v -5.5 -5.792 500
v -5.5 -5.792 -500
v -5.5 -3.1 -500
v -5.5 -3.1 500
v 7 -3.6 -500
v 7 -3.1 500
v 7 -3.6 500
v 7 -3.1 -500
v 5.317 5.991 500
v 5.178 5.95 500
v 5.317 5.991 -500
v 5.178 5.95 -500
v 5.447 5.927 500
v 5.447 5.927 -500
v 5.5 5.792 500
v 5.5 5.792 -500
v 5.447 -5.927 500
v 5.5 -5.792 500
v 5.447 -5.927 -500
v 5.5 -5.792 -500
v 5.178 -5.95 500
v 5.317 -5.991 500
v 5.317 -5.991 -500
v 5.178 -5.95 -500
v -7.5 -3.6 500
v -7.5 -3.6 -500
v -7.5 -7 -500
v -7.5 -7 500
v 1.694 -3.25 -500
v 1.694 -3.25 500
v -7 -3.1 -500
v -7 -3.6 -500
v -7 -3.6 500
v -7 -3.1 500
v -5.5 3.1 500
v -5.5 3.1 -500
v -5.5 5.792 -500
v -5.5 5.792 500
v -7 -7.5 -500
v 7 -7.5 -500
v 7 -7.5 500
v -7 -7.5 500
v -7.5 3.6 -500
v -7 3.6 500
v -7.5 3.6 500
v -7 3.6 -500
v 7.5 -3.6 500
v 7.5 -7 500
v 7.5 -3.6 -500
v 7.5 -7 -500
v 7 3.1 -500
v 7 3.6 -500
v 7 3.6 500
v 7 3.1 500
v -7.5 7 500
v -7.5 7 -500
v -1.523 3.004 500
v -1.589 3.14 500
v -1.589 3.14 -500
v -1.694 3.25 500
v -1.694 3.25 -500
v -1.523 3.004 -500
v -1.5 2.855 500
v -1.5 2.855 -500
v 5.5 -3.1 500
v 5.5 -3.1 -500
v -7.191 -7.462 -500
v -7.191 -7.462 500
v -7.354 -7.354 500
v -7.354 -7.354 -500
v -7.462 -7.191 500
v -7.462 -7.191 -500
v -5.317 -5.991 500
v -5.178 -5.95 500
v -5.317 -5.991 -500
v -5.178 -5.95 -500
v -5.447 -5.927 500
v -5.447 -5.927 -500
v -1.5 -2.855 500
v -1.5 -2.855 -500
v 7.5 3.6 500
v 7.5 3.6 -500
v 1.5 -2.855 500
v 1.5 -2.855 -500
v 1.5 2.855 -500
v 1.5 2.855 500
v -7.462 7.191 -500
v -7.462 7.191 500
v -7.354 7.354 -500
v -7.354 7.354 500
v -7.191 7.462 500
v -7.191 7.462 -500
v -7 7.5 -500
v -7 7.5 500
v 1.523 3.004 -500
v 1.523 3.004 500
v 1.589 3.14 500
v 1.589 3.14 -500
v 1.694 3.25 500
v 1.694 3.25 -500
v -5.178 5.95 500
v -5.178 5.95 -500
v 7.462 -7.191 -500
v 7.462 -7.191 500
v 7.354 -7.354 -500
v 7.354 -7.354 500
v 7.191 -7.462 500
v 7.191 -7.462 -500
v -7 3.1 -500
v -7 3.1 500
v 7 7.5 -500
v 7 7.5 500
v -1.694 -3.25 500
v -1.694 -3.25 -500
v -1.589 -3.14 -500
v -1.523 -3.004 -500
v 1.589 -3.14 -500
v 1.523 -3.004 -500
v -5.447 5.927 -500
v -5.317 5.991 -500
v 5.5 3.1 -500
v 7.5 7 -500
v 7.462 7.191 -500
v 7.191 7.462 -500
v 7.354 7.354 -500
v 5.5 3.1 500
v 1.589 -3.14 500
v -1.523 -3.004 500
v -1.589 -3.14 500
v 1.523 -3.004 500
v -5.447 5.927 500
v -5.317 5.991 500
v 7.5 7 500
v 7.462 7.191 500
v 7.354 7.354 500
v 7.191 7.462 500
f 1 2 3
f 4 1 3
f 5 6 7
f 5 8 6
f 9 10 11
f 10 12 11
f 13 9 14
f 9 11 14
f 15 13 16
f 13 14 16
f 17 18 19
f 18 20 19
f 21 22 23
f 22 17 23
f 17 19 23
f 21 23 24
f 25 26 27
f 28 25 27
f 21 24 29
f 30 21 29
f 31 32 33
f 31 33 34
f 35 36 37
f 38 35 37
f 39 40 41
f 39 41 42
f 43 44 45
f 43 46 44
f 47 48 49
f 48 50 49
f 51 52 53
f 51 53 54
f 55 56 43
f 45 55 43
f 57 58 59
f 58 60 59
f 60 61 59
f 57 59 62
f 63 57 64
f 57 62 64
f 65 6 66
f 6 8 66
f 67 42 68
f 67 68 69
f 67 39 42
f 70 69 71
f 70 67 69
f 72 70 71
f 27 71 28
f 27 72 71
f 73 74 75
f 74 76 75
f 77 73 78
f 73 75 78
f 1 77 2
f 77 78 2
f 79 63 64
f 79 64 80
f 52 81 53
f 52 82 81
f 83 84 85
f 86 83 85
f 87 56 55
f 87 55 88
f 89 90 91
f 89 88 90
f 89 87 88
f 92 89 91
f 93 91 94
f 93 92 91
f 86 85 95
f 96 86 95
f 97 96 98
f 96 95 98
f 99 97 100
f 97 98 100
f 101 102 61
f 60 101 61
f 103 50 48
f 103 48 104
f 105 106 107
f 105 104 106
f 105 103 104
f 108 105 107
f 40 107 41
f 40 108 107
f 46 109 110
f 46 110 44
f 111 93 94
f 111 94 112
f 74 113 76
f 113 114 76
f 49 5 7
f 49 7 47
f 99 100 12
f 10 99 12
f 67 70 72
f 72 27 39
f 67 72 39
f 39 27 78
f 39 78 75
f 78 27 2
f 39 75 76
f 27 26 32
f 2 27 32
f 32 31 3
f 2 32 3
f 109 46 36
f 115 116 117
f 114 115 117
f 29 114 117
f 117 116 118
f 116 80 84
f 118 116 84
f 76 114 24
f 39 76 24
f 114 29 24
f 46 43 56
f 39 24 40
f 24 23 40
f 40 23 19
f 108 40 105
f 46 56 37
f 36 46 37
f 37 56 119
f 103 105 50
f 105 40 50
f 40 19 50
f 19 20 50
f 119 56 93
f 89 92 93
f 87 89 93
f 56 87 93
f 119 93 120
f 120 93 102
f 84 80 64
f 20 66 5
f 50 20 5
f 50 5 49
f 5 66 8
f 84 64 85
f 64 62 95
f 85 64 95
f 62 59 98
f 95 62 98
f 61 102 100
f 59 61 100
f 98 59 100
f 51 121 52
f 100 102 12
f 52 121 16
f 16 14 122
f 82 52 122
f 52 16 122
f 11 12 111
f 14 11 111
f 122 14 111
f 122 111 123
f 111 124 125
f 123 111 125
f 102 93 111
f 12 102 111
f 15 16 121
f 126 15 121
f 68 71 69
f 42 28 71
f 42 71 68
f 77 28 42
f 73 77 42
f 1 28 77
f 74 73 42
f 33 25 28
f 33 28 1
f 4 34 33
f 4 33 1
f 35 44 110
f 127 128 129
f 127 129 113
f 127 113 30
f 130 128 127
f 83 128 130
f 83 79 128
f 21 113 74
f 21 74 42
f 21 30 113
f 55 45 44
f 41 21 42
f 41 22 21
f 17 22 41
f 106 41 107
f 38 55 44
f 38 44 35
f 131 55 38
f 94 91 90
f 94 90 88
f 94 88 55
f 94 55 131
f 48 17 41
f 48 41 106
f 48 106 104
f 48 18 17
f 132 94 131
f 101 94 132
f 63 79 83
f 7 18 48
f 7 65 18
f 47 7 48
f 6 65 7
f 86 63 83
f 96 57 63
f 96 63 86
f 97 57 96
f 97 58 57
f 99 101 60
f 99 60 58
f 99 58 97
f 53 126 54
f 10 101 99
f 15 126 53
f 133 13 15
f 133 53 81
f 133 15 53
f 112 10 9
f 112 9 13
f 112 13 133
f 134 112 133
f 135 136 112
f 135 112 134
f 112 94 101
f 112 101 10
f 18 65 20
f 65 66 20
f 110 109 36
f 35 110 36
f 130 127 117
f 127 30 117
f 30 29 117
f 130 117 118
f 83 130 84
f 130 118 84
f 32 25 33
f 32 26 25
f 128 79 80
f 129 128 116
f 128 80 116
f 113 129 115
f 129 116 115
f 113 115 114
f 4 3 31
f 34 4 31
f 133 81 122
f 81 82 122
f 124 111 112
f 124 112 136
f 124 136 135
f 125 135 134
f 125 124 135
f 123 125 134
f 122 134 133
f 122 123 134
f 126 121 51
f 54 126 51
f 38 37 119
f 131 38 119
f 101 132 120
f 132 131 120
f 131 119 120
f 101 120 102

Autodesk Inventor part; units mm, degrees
ref_plane "YZ Plane" through (0, 0, 0) normal (1, 0, 0) x (0, 1, 0)
ref_plane "XZ Plane" through (0, 0, 0) normal (0, 1, 0) x (-1, 0, 0)
ref_plane "XY Plane" through (0, 0, 0) normal (0, 0, 1) x (1, 0, 0)
sketch "Esboço1" plane through (0, 0, 0) normal (0, 0, 1) x (1, 0, 0)
  line L0 (7.5, 7.5) -> (-7.5, 7.5) construction
  line L1 (-7.5, 3.1) -> (-7.5, -3.1) construction
  line L2 (-7.5, 7.5) -> (-7.5, 3.1) construction
  line L3 (-7.5, 3.1) -> (-5.5, 3.1) construction
  line L4 (-5.5, 3.1) -> (-5.5, 6.2) construction
  line L5 (-5.5, 6.2) -> (-1.5, 3.1) construction
  line L6 (-1.5, 3.1) -> (-1.5, 0) construction
  line L7 (-1.5, 0) -> (0, 0)
  line L8 (0, 0) -> (0, 7.5)
  arc A0 (-7, 7.5) -> (-7.5, 7) centre (-7, 7) ccw
  line L9 (-7.5, 3.1) -> (-7, 3.1) construction
  line L10 (-7, 3.1) -> (-7, 3.6)
  line L11 (-7, 3.6) -> (-7.5, 3.6)
  line L12 (-7.5, 3.6) -> (-7.5, 3.1) construction
  line L13 (-7.5, 7) -> (-7.5, 3.6)
  line L14 (-7, 7.5) -> (0, 7.5)
  line L15 (-7, 3.1) -> (-5.5, 3.1)
  arc A1 (-5.1775, 5.9501) -> (-5.5, 5.792) centre (-5.3, 5.792) ccw
  line L16 (-5.5, 3.1) -> (-5.5, 5.792)
  arc A2 (-1.5, 2.8549) -> (-1.6937, 3.2501) centre (-2, 2.8549) ccw
  line L17 (-5.1775, 5.9501) -> (-1.6937, 3.2501)
  line L18 (-1.5, 2.8549) -> (-1.5, 0)
  point P0 (-7.5, 0)
  dimension "d0" = 15
  dimension "d1" = 6.2
  dimension "d2" = 7.5
  dimension "d4" = 2
  dimension "d5" = 6
  dimension "d7" = 3.1
  dimension "d10" = 0.5
  dimension "d11" = 0.5
  dimension "d12" = 0.2
  dimension "d13" = 0.5
extrude "Extrusão1" add sketch "Esboço1" along normal mid plane 1000
mirror "Espelhar1" about plane through (0, 0, 0) normal (1, 0, 0) of "Extrusão1"
mirror "Espelhar2" about plane through (0, 0, 0) normal (0, 1, 0) of "Extrusão1", "Espelhar1"
equation "\"d2\" = 0.5 * d0"
properties part number "15×15 2 slots profile_AST01501502" material "Bronze, Cast"
